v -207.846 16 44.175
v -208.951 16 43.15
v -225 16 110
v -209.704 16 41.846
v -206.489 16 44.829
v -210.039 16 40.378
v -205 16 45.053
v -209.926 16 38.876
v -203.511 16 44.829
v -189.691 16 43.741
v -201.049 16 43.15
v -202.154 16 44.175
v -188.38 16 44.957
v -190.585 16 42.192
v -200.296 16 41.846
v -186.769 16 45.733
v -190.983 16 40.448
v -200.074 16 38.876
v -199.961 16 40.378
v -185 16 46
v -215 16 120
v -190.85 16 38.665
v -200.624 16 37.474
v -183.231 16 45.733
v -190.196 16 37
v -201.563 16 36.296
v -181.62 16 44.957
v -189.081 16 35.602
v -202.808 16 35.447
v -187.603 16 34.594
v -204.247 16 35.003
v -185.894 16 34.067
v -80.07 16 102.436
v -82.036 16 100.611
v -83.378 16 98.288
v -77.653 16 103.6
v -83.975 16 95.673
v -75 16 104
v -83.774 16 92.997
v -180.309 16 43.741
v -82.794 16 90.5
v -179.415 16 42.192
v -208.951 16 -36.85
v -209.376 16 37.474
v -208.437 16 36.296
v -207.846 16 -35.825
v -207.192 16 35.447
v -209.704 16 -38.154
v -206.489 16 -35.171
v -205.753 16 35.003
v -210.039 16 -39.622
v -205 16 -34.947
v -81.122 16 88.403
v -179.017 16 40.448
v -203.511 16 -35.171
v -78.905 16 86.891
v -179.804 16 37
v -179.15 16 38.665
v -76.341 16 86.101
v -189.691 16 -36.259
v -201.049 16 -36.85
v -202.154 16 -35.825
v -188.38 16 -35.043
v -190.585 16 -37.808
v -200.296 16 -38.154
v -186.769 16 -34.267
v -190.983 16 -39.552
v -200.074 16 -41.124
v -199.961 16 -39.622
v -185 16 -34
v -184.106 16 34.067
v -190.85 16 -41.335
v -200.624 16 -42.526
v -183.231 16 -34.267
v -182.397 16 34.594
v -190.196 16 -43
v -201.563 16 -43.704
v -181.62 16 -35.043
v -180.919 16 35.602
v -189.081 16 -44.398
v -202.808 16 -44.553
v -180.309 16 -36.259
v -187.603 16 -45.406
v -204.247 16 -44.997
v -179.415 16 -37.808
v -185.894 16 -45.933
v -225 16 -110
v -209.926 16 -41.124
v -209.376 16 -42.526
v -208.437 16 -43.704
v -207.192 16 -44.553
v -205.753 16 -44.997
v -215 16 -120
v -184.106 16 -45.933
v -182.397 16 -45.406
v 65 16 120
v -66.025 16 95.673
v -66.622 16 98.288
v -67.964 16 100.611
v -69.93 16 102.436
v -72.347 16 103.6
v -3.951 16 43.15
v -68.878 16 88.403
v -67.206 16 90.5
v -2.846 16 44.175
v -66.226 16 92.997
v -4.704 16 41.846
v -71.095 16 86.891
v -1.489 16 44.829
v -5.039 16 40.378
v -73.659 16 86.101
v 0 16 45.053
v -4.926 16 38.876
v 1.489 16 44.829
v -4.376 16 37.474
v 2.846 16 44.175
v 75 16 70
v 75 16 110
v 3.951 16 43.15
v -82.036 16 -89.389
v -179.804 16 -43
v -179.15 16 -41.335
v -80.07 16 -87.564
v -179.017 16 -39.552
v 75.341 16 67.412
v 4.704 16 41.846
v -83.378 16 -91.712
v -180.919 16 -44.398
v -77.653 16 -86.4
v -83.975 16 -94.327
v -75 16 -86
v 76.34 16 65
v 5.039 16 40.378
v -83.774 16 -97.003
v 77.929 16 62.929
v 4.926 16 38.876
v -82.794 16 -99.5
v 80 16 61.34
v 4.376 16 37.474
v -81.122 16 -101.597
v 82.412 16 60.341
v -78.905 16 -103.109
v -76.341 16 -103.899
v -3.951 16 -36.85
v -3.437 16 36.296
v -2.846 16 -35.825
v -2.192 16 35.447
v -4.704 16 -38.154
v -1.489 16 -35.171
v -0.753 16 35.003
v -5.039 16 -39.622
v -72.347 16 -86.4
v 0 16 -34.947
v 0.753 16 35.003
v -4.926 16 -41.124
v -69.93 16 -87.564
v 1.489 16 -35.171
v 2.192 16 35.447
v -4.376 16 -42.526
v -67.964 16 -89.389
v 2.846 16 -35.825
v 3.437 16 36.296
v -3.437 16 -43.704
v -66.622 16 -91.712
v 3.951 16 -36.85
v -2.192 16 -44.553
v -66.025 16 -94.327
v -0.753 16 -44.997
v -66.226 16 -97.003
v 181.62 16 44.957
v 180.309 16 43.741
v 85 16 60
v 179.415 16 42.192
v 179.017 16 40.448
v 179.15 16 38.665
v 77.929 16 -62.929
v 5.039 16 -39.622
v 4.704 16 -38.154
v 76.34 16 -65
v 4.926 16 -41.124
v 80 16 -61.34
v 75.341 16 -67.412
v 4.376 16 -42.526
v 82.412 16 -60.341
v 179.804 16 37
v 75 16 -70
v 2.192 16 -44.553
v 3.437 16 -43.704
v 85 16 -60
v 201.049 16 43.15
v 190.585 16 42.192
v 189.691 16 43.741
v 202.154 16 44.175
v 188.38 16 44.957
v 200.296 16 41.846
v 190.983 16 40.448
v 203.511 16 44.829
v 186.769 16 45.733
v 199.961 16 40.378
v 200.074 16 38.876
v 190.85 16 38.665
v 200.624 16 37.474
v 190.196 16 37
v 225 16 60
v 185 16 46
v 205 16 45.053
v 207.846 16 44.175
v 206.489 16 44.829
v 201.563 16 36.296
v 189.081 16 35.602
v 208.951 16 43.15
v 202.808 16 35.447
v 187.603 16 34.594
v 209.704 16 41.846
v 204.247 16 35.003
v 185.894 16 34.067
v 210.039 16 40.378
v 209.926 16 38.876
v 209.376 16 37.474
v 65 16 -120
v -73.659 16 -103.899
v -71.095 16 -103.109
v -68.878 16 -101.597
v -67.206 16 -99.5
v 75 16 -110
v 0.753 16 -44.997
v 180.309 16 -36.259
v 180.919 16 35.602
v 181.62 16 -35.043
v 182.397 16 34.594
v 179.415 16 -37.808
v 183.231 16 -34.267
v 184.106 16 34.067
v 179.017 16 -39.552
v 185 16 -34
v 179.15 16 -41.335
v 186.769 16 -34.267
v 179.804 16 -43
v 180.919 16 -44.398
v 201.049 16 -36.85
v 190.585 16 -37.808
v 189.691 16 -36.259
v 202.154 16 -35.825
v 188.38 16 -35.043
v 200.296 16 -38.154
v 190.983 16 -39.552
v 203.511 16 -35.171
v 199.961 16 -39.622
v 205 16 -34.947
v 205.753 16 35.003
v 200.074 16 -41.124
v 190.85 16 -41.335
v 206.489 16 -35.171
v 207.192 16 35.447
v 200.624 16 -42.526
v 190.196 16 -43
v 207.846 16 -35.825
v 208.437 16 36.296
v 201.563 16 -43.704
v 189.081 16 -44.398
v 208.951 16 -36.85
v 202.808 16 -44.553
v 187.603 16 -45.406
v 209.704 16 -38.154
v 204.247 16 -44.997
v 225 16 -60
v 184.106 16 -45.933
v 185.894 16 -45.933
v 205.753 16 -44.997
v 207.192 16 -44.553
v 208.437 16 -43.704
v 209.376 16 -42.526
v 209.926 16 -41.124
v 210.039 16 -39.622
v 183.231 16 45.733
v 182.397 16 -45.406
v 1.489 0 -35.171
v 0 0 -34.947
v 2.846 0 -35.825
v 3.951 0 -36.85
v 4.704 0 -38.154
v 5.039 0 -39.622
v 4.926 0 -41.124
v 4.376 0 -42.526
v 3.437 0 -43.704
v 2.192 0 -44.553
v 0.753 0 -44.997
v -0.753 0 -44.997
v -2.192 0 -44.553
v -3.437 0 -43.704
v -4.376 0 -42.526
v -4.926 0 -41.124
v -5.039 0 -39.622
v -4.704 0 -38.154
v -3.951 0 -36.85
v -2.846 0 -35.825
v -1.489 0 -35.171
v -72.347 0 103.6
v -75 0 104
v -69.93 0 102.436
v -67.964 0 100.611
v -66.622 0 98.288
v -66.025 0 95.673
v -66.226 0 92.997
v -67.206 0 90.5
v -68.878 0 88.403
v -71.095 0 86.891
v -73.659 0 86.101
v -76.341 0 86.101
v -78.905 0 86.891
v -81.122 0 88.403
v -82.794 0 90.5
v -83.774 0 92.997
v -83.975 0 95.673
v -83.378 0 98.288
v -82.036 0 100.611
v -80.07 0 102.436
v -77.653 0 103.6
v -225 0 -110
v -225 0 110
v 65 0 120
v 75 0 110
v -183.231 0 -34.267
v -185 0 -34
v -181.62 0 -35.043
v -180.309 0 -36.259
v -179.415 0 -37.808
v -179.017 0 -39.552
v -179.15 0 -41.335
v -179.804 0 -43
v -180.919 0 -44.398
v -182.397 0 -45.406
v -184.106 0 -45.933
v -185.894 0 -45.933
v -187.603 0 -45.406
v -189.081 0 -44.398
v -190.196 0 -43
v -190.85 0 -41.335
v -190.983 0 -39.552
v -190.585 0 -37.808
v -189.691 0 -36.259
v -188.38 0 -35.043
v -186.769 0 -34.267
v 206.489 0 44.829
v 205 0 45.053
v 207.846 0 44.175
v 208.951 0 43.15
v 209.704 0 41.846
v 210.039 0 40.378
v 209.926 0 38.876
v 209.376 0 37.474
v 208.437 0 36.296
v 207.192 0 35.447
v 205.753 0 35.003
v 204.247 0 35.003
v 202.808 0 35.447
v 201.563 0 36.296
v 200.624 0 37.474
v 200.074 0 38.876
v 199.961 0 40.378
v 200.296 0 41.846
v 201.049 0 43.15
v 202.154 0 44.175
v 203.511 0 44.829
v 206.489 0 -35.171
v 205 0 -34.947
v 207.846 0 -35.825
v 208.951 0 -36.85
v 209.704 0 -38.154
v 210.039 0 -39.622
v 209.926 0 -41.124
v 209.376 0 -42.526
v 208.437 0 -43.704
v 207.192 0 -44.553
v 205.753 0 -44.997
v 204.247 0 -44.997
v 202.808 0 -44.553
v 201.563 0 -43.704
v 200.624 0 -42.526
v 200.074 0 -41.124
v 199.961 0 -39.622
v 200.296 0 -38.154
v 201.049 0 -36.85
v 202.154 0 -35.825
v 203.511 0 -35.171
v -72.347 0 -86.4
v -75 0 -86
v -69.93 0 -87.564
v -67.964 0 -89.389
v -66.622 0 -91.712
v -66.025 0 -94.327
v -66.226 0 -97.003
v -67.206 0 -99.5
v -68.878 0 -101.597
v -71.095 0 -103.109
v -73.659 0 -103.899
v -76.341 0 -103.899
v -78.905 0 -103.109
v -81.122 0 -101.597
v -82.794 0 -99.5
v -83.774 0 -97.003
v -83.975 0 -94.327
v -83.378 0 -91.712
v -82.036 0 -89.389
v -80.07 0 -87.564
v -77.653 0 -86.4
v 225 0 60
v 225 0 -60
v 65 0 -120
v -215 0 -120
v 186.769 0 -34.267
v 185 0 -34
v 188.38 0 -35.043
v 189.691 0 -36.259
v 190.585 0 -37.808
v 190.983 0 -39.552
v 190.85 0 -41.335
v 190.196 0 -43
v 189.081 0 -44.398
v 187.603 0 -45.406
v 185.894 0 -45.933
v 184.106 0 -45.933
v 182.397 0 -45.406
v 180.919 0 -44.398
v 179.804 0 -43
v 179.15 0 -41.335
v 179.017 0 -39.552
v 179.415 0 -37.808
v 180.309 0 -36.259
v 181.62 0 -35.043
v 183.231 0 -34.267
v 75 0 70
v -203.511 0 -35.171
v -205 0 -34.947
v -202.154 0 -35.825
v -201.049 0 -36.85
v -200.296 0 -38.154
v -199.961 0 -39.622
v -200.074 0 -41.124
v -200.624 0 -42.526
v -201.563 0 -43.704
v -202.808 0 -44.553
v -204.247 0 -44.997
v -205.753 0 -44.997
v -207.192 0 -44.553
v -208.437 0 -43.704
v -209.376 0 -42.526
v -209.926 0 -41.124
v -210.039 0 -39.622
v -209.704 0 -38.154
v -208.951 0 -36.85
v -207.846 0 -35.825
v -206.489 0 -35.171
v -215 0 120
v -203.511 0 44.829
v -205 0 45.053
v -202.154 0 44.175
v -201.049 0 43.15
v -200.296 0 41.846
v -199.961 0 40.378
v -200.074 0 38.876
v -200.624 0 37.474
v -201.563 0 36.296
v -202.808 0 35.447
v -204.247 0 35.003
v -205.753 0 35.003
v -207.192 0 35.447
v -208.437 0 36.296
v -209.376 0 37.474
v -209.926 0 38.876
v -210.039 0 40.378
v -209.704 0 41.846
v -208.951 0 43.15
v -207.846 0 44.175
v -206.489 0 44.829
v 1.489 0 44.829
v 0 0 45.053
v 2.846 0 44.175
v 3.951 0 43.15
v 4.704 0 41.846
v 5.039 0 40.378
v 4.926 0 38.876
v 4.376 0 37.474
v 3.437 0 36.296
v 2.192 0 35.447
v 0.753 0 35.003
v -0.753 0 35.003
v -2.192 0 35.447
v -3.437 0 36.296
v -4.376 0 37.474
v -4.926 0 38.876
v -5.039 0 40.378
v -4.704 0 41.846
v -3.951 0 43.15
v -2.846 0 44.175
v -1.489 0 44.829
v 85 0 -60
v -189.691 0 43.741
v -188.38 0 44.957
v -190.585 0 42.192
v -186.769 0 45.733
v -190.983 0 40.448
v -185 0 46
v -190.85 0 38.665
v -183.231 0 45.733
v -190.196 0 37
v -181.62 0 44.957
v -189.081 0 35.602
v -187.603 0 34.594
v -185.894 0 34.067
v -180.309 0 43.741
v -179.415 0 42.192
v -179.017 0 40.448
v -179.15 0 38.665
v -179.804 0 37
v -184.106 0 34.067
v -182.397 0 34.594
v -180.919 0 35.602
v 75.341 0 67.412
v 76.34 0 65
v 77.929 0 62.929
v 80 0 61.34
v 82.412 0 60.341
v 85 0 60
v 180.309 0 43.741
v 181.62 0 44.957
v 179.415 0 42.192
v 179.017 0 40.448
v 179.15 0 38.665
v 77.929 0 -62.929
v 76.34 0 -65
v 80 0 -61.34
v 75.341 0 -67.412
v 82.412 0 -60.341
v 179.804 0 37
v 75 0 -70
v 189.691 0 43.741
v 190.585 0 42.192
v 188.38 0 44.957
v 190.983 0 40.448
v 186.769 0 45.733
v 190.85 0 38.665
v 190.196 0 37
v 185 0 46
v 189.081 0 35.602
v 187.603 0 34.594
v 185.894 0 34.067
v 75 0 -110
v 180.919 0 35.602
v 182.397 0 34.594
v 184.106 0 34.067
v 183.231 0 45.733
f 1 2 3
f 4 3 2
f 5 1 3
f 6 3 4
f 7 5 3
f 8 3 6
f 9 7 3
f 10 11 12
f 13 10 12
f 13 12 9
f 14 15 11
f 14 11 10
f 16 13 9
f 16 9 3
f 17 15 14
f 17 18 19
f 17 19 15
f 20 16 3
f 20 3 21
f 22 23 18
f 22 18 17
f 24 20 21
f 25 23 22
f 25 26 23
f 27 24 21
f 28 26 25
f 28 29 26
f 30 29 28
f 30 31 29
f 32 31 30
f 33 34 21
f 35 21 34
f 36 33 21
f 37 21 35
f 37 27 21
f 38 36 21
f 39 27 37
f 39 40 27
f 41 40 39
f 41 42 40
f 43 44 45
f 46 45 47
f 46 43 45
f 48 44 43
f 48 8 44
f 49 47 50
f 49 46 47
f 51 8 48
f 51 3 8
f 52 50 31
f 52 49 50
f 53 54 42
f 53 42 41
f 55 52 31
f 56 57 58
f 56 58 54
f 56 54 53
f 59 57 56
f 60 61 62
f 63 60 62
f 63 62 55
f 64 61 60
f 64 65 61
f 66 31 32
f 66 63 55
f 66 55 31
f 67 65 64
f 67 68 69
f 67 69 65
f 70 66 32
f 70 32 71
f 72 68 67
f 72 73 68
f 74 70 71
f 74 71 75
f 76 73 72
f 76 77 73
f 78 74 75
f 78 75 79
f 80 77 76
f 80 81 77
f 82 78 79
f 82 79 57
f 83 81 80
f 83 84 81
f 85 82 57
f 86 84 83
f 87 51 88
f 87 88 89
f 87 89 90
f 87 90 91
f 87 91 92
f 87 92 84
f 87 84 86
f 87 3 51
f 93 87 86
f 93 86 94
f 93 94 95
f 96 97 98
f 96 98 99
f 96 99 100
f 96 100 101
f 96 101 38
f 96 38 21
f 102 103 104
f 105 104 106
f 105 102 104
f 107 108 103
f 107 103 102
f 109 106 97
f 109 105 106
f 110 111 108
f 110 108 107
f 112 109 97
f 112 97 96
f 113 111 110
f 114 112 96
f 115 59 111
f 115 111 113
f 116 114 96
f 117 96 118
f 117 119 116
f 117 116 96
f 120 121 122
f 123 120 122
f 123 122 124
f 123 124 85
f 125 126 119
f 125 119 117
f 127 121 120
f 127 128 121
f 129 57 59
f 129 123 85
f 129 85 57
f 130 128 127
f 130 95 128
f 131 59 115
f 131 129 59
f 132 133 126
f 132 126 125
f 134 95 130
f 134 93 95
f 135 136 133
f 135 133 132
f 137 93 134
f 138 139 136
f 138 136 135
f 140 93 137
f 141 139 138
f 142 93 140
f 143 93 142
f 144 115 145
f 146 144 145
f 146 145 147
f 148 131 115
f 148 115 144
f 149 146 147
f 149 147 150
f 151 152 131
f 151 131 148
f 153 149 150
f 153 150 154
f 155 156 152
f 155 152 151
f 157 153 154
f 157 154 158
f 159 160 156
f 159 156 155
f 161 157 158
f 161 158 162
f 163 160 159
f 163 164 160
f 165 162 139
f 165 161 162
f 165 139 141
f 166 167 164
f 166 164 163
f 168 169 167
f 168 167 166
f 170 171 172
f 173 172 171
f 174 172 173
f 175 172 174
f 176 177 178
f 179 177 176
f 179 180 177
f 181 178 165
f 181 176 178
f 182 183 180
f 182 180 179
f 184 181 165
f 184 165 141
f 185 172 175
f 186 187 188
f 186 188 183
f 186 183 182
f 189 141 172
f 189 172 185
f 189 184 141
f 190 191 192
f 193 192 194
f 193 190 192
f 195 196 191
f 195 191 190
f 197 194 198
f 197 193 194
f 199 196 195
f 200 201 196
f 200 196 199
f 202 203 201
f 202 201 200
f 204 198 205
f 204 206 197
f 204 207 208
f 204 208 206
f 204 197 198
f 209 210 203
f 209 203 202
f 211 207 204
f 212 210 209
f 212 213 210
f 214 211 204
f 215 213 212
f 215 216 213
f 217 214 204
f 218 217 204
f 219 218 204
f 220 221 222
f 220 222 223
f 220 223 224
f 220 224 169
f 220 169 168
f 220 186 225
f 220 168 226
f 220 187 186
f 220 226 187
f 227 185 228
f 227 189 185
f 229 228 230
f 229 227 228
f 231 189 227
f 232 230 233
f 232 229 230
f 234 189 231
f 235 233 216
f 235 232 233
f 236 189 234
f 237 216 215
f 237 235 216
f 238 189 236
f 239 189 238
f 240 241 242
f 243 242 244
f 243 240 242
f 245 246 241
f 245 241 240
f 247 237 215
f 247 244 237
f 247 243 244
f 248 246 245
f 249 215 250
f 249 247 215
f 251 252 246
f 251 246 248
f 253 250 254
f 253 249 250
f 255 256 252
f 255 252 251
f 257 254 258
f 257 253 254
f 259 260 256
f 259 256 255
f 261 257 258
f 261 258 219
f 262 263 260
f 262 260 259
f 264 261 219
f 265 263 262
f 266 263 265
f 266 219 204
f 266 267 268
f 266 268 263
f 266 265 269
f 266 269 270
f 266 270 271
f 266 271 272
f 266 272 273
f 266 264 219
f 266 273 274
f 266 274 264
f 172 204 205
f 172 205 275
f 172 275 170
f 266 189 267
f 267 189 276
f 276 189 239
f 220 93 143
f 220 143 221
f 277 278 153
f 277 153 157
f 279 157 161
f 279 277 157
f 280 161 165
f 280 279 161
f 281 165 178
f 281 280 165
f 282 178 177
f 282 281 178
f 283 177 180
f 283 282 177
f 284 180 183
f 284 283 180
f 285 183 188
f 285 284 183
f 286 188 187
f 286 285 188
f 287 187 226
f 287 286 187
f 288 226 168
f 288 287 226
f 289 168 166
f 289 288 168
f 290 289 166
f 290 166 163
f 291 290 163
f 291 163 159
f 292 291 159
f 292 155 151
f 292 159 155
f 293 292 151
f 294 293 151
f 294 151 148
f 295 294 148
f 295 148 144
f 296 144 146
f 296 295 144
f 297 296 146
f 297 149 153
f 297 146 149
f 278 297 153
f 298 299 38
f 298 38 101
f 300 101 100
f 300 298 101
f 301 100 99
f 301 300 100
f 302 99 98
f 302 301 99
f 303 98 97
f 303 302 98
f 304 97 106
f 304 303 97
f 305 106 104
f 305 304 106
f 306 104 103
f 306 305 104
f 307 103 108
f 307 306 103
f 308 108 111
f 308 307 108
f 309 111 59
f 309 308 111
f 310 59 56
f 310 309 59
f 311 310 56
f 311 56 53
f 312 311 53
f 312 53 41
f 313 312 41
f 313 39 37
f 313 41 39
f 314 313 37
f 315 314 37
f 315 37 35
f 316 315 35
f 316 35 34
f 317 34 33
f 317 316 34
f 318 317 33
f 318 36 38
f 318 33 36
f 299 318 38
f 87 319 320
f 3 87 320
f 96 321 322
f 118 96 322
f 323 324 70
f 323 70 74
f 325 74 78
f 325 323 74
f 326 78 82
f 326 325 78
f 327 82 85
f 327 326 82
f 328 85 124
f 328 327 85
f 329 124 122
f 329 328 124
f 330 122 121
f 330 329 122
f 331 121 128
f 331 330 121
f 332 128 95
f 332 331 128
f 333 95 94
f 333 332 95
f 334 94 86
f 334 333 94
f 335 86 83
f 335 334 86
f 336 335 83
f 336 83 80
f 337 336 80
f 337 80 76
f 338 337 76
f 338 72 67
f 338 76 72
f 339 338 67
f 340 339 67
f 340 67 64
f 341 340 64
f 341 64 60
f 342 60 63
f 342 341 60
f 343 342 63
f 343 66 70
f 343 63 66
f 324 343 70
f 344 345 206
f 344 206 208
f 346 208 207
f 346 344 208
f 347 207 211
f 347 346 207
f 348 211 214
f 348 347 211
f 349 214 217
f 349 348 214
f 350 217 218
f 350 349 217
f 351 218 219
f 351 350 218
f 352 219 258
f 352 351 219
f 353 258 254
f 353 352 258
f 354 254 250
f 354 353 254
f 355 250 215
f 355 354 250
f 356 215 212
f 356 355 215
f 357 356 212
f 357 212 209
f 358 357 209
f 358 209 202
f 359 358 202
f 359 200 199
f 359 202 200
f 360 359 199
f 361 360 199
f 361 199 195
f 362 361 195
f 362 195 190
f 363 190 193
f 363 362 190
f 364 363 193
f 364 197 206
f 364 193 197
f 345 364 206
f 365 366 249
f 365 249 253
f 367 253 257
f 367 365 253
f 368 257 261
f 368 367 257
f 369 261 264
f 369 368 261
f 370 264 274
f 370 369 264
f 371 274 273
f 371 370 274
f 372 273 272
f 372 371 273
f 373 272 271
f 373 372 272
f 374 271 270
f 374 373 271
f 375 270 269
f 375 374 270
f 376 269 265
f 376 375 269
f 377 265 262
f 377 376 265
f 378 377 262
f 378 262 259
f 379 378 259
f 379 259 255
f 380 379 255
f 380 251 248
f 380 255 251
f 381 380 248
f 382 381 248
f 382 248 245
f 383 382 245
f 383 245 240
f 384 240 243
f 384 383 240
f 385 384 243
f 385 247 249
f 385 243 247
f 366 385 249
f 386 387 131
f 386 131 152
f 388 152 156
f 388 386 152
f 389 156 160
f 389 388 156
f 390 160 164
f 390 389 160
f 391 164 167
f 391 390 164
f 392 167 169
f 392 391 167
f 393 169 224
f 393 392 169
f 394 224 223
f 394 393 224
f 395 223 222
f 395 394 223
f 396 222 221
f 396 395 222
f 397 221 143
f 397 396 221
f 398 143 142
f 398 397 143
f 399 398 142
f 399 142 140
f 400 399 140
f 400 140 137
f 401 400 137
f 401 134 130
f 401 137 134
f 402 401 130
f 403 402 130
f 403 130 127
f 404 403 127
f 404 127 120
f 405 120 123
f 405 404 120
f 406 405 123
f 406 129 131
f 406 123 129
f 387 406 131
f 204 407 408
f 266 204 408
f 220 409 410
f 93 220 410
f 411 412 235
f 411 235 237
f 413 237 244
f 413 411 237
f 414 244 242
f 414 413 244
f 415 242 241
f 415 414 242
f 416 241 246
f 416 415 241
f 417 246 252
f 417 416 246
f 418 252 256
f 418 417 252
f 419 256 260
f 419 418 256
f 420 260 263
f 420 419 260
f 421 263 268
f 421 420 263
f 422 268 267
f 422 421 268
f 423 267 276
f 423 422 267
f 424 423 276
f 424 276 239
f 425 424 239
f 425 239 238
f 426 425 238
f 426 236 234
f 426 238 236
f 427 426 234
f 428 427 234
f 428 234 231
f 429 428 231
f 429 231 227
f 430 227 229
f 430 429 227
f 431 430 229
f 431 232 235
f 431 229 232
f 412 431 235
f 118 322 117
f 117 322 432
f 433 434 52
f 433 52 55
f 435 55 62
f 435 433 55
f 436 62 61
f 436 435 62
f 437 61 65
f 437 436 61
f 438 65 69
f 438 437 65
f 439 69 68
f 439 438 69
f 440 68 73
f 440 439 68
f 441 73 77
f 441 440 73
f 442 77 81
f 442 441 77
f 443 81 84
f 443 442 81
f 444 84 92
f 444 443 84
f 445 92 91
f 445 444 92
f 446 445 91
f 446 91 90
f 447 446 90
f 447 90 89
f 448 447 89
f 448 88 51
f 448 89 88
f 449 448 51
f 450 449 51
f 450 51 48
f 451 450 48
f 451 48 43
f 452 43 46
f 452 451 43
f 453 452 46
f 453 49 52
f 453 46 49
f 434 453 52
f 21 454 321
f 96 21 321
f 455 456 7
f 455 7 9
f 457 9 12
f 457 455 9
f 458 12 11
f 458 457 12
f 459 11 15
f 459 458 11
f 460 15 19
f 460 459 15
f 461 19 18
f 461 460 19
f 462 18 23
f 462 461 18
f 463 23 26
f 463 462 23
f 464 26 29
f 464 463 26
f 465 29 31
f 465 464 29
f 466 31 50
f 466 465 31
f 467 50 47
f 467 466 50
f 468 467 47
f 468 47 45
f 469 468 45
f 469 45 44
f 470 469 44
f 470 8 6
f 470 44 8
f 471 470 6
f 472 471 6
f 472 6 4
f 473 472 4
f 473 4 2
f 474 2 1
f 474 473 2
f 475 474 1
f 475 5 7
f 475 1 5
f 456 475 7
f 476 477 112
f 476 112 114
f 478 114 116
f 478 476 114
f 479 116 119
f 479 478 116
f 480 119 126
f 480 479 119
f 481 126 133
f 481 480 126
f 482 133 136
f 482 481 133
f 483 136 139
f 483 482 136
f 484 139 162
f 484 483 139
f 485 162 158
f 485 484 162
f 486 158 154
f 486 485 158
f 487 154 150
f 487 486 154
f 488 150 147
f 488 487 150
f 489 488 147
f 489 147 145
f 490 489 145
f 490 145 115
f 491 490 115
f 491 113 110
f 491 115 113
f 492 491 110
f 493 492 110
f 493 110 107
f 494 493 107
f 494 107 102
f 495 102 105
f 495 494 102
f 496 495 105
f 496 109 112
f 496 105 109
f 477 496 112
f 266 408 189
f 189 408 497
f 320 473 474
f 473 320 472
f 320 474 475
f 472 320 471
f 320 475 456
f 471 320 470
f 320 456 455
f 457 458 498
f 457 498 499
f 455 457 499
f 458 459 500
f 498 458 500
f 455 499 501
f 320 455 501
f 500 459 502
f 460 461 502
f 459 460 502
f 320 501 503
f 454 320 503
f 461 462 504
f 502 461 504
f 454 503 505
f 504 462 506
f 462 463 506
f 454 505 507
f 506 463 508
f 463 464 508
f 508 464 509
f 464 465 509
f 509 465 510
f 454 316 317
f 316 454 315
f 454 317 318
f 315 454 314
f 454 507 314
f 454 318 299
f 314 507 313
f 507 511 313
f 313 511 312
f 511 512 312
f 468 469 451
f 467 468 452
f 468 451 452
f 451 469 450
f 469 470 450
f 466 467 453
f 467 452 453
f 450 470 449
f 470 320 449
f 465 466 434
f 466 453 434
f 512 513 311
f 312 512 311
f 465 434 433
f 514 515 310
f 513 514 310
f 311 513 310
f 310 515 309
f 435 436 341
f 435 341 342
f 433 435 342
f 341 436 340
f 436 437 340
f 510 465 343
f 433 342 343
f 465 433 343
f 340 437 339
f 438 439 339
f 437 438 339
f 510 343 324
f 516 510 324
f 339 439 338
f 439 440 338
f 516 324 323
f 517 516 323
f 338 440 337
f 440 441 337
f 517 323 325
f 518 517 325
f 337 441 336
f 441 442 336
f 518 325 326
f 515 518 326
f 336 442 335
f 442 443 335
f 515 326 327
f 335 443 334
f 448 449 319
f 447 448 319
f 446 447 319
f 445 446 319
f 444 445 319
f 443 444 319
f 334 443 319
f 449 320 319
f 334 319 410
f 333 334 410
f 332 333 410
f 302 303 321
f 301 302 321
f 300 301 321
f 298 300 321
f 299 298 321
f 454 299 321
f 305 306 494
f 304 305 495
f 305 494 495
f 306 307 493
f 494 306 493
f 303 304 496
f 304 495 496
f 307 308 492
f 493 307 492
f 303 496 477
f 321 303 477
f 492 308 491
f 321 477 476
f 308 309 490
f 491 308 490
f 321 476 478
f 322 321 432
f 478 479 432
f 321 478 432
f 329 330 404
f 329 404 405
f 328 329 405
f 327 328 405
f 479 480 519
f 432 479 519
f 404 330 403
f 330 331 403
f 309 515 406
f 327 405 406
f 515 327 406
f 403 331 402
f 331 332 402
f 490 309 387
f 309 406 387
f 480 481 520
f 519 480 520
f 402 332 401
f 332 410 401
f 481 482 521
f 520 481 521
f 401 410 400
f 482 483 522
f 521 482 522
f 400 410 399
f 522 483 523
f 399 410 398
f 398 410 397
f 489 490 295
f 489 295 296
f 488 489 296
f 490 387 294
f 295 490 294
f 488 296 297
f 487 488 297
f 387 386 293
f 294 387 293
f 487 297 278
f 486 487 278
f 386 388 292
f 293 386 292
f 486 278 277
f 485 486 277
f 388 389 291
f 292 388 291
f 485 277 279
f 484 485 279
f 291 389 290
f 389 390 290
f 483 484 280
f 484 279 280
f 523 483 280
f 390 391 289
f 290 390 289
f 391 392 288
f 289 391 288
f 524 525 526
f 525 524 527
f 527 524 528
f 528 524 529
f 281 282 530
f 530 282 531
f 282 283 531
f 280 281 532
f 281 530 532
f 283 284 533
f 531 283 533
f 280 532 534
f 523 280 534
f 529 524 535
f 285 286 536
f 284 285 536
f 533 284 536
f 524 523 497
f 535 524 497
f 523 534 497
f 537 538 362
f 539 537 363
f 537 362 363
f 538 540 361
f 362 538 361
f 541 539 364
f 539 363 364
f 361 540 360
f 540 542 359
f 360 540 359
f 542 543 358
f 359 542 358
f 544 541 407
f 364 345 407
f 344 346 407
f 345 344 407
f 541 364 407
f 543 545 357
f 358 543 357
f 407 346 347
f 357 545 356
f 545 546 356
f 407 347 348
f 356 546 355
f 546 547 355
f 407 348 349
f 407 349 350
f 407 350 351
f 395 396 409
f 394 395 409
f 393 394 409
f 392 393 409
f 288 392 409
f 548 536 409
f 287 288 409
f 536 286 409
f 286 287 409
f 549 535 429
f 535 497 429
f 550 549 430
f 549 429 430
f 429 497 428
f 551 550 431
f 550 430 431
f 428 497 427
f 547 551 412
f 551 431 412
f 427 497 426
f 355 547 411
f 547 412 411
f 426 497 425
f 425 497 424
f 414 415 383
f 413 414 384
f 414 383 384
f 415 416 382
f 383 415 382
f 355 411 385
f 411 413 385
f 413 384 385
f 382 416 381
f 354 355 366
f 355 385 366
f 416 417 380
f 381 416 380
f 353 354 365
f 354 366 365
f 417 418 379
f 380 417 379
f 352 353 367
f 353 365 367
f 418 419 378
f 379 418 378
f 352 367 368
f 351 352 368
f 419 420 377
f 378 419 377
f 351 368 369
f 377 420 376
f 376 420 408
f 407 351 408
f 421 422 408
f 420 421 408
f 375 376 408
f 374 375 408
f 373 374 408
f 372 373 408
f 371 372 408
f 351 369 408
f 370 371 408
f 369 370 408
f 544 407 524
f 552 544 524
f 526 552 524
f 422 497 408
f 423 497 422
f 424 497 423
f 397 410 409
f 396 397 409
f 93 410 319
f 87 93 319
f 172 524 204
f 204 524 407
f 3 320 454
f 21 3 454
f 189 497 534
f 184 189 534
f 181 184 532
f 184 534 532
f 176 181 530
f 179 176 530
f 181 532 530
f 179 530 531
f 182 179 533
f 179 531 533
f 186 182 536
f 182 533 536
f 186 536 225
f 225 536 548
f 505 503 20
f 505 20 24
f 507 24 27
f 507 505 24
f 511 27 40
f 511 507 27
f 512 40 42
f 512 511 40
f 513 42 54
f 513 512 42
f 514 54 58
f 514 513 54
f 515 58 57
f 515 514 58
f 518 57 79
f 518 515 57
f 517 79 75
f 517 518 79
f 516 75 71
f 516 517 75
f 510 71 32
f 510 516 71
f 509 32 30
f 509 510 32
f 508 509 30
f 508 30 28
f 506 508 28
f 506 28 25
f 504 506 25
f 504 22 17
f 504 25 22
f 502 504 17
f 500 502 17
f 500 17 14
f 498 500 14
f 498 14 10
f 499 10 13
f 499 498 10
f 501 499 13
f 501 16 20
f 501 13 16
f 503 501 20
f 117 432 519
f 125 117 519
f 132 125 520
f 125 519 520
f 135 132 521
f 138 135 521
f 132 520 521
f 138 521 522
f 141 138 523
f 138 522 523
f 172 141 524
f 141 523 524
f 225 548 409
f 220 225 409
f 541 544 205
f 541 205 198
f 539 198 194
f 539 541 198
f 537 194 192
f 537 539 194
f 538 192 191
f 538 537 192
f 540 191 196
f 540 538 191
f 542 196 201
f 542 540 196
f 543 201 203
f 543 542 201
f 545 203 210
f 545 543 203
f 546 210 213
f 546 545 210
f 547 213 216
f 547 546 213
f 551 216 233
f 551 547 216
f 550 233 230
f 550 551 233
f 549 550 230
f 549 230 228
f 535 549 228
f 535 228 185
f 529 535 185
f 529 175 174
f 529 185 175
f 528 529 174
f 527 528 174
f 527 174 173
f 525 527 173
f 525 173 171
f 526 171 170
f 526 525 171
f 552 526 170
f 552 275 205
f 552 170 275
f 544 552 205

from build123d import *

# Parameters (mm, degrees)
EXTRUDE_1_DEPTH          = 16
CUT_EXTRUDE_1_DEPTH      = 256.501467706
CUT_EXTRUDE_1_DEPTH_BACK = 256.501467706
SKETCH_2_R               = 9
CUT_EXTRUDE_2_DEPTH      = 256.501467706
CUT_EXTRUDE_2_DEPTH_BACK = 256.501467706
SKETCH_3_R               = 6
CUT_EXTRUDE_3_DEPTH      = 256.501467706
CUT_EXTRUDE_3_DEPTH_BACK = 256.501467706
SKETCH_4_R               = 5.053


with BuildPart() as part:
    # ｽｹｯﾁ1 → ﾎﾞｽ - 押し出し1 (new body)
    with BuildSketch(Plane(origin=(0, 0, 0), x_dir=(1, 0, 0), z_dir=(0, 1, 0))):
        with BuildLine():
            Line((-215, -120), (65, -120))
            Line((65, -120), (75, -110))
            Line((75, -110), (75, -70))
            ThreePointArc((75, -70), (77.928932188, -62.928932188), (85, -60))
            Line((85, -60), (225, -60))
            Line((225, -60), (225, 60))
            Line((225, 60), (85, 60))
            ThreePointArc((85, 60), (77.928932188, 62.928932188), (75, 70))
            Line((75, 70), (75, 110))
            Line((75, 110), (65, 120))
            Line((65, 120), (-215, 120))
            Line((-215, 120), (-225, 110))
            Line((-225, 110), (-225, -110))
            Line((-225, -110), (-215, -120))
        make_face()
    extrude(amount=EXTRUDE_1_DEPTH)

    # ｽｹｯﾁ2 → ｶｯﾄ - 押し出し1 (cut, two sides: drawn at the far end of the back side and taken through both)
    with BuildSketch(Plane(origin=(0, 0, 0), x_dir=(1, 0, 0), z_dir=(0, 1, 0)).offset(-CUT_EXTRUDE_1_DEPTH_BACK)):
        with Locations(Location((-75, -95, 0), (0, 0, 270))):
            Circle(SKETCH_2_R)
        with Locations(Location((-75, 95, 0), (0, 0, 270))):
            Circle(SKETCH_2_R)
    extrude(amount=CUT_EXTRUDE_1_DEPTH + CUT_EXTRUDE_1_DEPTH_BACK, mode=Mode.SUBTRACT)

    # ｽｹｯﾁ3 → ｶｯﾄ - 押し出し2 (cut, two sides: drawn at the far end of the back side and taken through both)
    with BuildSketch(Plane(origin=(0, 0, 0), x_dir=(1, 0, 0), z_dir=(0, 1, 0)).offset(-CUT_EXTRUDE_2_DEPTH_BACK)):
        with Locations(Location((-185, -40, 0), (0, 0, 270))):
            Circle(SKETCH_3_R)
        with Locations(Location((-185, 40, 0), (0, 0, 270))):
            Circle(SKETCH_3_R)
        with Locations(Location((185, -40, 0), (0, 0, 270))):
            Circle(SKETCH_3_R)
        with Locations(Location((185, 40, 0), (0, 0, 270))):
            Circle(SKETCH_3_R)
    extrude(amount=CUT_EXTRUDE_2_DEPTH + CUT_EXTRUDE_2_DEPTH_BACK, mode=Mode.SUBTRACT)

    # ｽｹｯﾁ4 → ｶｯﾄ - 押し出し3 (cut, two sides: drawn at the far end of the back side and taken through both)
    with BuildSketch(Plane(origin=(0, 0, 0), x_dir=(1, 0, 0), z_dir=(0, 1, 0)).offset(-CUT_EXTRUDE_3_DEPTH_BACK)):
        with Locations(Location((-205, -40, 0), (0, 0, 270))):
            Circle(SKETCH_4_R)
        with Locations(Location((-205, 40, 0), (0, 0, 270))):
            Circle(SKETCH_4_R)
        with Locations(Location((0, -40, 0), (0, 0, 270))):
            Circle(SKETCH_4_R)
        with Locations(Location((0, 40, 0), (0, 0, 270))):
            Circle(SKETCH_4_R)
        with Locations(Location((205, -40, 0), (0, 0, 270))):
            Circle(SKETCH_4_R)
        with Locations(Location((205, 40, 0), (0, 0, 270))):
            Circle(SKETCH_4_R)
    extrude(amount=CUT_EXTRUDE_3_DEPTH + CUT_EXTRUDE_3_DEPTH_BACK, mode=Mode.SUBTRACT)


solid = part.part
